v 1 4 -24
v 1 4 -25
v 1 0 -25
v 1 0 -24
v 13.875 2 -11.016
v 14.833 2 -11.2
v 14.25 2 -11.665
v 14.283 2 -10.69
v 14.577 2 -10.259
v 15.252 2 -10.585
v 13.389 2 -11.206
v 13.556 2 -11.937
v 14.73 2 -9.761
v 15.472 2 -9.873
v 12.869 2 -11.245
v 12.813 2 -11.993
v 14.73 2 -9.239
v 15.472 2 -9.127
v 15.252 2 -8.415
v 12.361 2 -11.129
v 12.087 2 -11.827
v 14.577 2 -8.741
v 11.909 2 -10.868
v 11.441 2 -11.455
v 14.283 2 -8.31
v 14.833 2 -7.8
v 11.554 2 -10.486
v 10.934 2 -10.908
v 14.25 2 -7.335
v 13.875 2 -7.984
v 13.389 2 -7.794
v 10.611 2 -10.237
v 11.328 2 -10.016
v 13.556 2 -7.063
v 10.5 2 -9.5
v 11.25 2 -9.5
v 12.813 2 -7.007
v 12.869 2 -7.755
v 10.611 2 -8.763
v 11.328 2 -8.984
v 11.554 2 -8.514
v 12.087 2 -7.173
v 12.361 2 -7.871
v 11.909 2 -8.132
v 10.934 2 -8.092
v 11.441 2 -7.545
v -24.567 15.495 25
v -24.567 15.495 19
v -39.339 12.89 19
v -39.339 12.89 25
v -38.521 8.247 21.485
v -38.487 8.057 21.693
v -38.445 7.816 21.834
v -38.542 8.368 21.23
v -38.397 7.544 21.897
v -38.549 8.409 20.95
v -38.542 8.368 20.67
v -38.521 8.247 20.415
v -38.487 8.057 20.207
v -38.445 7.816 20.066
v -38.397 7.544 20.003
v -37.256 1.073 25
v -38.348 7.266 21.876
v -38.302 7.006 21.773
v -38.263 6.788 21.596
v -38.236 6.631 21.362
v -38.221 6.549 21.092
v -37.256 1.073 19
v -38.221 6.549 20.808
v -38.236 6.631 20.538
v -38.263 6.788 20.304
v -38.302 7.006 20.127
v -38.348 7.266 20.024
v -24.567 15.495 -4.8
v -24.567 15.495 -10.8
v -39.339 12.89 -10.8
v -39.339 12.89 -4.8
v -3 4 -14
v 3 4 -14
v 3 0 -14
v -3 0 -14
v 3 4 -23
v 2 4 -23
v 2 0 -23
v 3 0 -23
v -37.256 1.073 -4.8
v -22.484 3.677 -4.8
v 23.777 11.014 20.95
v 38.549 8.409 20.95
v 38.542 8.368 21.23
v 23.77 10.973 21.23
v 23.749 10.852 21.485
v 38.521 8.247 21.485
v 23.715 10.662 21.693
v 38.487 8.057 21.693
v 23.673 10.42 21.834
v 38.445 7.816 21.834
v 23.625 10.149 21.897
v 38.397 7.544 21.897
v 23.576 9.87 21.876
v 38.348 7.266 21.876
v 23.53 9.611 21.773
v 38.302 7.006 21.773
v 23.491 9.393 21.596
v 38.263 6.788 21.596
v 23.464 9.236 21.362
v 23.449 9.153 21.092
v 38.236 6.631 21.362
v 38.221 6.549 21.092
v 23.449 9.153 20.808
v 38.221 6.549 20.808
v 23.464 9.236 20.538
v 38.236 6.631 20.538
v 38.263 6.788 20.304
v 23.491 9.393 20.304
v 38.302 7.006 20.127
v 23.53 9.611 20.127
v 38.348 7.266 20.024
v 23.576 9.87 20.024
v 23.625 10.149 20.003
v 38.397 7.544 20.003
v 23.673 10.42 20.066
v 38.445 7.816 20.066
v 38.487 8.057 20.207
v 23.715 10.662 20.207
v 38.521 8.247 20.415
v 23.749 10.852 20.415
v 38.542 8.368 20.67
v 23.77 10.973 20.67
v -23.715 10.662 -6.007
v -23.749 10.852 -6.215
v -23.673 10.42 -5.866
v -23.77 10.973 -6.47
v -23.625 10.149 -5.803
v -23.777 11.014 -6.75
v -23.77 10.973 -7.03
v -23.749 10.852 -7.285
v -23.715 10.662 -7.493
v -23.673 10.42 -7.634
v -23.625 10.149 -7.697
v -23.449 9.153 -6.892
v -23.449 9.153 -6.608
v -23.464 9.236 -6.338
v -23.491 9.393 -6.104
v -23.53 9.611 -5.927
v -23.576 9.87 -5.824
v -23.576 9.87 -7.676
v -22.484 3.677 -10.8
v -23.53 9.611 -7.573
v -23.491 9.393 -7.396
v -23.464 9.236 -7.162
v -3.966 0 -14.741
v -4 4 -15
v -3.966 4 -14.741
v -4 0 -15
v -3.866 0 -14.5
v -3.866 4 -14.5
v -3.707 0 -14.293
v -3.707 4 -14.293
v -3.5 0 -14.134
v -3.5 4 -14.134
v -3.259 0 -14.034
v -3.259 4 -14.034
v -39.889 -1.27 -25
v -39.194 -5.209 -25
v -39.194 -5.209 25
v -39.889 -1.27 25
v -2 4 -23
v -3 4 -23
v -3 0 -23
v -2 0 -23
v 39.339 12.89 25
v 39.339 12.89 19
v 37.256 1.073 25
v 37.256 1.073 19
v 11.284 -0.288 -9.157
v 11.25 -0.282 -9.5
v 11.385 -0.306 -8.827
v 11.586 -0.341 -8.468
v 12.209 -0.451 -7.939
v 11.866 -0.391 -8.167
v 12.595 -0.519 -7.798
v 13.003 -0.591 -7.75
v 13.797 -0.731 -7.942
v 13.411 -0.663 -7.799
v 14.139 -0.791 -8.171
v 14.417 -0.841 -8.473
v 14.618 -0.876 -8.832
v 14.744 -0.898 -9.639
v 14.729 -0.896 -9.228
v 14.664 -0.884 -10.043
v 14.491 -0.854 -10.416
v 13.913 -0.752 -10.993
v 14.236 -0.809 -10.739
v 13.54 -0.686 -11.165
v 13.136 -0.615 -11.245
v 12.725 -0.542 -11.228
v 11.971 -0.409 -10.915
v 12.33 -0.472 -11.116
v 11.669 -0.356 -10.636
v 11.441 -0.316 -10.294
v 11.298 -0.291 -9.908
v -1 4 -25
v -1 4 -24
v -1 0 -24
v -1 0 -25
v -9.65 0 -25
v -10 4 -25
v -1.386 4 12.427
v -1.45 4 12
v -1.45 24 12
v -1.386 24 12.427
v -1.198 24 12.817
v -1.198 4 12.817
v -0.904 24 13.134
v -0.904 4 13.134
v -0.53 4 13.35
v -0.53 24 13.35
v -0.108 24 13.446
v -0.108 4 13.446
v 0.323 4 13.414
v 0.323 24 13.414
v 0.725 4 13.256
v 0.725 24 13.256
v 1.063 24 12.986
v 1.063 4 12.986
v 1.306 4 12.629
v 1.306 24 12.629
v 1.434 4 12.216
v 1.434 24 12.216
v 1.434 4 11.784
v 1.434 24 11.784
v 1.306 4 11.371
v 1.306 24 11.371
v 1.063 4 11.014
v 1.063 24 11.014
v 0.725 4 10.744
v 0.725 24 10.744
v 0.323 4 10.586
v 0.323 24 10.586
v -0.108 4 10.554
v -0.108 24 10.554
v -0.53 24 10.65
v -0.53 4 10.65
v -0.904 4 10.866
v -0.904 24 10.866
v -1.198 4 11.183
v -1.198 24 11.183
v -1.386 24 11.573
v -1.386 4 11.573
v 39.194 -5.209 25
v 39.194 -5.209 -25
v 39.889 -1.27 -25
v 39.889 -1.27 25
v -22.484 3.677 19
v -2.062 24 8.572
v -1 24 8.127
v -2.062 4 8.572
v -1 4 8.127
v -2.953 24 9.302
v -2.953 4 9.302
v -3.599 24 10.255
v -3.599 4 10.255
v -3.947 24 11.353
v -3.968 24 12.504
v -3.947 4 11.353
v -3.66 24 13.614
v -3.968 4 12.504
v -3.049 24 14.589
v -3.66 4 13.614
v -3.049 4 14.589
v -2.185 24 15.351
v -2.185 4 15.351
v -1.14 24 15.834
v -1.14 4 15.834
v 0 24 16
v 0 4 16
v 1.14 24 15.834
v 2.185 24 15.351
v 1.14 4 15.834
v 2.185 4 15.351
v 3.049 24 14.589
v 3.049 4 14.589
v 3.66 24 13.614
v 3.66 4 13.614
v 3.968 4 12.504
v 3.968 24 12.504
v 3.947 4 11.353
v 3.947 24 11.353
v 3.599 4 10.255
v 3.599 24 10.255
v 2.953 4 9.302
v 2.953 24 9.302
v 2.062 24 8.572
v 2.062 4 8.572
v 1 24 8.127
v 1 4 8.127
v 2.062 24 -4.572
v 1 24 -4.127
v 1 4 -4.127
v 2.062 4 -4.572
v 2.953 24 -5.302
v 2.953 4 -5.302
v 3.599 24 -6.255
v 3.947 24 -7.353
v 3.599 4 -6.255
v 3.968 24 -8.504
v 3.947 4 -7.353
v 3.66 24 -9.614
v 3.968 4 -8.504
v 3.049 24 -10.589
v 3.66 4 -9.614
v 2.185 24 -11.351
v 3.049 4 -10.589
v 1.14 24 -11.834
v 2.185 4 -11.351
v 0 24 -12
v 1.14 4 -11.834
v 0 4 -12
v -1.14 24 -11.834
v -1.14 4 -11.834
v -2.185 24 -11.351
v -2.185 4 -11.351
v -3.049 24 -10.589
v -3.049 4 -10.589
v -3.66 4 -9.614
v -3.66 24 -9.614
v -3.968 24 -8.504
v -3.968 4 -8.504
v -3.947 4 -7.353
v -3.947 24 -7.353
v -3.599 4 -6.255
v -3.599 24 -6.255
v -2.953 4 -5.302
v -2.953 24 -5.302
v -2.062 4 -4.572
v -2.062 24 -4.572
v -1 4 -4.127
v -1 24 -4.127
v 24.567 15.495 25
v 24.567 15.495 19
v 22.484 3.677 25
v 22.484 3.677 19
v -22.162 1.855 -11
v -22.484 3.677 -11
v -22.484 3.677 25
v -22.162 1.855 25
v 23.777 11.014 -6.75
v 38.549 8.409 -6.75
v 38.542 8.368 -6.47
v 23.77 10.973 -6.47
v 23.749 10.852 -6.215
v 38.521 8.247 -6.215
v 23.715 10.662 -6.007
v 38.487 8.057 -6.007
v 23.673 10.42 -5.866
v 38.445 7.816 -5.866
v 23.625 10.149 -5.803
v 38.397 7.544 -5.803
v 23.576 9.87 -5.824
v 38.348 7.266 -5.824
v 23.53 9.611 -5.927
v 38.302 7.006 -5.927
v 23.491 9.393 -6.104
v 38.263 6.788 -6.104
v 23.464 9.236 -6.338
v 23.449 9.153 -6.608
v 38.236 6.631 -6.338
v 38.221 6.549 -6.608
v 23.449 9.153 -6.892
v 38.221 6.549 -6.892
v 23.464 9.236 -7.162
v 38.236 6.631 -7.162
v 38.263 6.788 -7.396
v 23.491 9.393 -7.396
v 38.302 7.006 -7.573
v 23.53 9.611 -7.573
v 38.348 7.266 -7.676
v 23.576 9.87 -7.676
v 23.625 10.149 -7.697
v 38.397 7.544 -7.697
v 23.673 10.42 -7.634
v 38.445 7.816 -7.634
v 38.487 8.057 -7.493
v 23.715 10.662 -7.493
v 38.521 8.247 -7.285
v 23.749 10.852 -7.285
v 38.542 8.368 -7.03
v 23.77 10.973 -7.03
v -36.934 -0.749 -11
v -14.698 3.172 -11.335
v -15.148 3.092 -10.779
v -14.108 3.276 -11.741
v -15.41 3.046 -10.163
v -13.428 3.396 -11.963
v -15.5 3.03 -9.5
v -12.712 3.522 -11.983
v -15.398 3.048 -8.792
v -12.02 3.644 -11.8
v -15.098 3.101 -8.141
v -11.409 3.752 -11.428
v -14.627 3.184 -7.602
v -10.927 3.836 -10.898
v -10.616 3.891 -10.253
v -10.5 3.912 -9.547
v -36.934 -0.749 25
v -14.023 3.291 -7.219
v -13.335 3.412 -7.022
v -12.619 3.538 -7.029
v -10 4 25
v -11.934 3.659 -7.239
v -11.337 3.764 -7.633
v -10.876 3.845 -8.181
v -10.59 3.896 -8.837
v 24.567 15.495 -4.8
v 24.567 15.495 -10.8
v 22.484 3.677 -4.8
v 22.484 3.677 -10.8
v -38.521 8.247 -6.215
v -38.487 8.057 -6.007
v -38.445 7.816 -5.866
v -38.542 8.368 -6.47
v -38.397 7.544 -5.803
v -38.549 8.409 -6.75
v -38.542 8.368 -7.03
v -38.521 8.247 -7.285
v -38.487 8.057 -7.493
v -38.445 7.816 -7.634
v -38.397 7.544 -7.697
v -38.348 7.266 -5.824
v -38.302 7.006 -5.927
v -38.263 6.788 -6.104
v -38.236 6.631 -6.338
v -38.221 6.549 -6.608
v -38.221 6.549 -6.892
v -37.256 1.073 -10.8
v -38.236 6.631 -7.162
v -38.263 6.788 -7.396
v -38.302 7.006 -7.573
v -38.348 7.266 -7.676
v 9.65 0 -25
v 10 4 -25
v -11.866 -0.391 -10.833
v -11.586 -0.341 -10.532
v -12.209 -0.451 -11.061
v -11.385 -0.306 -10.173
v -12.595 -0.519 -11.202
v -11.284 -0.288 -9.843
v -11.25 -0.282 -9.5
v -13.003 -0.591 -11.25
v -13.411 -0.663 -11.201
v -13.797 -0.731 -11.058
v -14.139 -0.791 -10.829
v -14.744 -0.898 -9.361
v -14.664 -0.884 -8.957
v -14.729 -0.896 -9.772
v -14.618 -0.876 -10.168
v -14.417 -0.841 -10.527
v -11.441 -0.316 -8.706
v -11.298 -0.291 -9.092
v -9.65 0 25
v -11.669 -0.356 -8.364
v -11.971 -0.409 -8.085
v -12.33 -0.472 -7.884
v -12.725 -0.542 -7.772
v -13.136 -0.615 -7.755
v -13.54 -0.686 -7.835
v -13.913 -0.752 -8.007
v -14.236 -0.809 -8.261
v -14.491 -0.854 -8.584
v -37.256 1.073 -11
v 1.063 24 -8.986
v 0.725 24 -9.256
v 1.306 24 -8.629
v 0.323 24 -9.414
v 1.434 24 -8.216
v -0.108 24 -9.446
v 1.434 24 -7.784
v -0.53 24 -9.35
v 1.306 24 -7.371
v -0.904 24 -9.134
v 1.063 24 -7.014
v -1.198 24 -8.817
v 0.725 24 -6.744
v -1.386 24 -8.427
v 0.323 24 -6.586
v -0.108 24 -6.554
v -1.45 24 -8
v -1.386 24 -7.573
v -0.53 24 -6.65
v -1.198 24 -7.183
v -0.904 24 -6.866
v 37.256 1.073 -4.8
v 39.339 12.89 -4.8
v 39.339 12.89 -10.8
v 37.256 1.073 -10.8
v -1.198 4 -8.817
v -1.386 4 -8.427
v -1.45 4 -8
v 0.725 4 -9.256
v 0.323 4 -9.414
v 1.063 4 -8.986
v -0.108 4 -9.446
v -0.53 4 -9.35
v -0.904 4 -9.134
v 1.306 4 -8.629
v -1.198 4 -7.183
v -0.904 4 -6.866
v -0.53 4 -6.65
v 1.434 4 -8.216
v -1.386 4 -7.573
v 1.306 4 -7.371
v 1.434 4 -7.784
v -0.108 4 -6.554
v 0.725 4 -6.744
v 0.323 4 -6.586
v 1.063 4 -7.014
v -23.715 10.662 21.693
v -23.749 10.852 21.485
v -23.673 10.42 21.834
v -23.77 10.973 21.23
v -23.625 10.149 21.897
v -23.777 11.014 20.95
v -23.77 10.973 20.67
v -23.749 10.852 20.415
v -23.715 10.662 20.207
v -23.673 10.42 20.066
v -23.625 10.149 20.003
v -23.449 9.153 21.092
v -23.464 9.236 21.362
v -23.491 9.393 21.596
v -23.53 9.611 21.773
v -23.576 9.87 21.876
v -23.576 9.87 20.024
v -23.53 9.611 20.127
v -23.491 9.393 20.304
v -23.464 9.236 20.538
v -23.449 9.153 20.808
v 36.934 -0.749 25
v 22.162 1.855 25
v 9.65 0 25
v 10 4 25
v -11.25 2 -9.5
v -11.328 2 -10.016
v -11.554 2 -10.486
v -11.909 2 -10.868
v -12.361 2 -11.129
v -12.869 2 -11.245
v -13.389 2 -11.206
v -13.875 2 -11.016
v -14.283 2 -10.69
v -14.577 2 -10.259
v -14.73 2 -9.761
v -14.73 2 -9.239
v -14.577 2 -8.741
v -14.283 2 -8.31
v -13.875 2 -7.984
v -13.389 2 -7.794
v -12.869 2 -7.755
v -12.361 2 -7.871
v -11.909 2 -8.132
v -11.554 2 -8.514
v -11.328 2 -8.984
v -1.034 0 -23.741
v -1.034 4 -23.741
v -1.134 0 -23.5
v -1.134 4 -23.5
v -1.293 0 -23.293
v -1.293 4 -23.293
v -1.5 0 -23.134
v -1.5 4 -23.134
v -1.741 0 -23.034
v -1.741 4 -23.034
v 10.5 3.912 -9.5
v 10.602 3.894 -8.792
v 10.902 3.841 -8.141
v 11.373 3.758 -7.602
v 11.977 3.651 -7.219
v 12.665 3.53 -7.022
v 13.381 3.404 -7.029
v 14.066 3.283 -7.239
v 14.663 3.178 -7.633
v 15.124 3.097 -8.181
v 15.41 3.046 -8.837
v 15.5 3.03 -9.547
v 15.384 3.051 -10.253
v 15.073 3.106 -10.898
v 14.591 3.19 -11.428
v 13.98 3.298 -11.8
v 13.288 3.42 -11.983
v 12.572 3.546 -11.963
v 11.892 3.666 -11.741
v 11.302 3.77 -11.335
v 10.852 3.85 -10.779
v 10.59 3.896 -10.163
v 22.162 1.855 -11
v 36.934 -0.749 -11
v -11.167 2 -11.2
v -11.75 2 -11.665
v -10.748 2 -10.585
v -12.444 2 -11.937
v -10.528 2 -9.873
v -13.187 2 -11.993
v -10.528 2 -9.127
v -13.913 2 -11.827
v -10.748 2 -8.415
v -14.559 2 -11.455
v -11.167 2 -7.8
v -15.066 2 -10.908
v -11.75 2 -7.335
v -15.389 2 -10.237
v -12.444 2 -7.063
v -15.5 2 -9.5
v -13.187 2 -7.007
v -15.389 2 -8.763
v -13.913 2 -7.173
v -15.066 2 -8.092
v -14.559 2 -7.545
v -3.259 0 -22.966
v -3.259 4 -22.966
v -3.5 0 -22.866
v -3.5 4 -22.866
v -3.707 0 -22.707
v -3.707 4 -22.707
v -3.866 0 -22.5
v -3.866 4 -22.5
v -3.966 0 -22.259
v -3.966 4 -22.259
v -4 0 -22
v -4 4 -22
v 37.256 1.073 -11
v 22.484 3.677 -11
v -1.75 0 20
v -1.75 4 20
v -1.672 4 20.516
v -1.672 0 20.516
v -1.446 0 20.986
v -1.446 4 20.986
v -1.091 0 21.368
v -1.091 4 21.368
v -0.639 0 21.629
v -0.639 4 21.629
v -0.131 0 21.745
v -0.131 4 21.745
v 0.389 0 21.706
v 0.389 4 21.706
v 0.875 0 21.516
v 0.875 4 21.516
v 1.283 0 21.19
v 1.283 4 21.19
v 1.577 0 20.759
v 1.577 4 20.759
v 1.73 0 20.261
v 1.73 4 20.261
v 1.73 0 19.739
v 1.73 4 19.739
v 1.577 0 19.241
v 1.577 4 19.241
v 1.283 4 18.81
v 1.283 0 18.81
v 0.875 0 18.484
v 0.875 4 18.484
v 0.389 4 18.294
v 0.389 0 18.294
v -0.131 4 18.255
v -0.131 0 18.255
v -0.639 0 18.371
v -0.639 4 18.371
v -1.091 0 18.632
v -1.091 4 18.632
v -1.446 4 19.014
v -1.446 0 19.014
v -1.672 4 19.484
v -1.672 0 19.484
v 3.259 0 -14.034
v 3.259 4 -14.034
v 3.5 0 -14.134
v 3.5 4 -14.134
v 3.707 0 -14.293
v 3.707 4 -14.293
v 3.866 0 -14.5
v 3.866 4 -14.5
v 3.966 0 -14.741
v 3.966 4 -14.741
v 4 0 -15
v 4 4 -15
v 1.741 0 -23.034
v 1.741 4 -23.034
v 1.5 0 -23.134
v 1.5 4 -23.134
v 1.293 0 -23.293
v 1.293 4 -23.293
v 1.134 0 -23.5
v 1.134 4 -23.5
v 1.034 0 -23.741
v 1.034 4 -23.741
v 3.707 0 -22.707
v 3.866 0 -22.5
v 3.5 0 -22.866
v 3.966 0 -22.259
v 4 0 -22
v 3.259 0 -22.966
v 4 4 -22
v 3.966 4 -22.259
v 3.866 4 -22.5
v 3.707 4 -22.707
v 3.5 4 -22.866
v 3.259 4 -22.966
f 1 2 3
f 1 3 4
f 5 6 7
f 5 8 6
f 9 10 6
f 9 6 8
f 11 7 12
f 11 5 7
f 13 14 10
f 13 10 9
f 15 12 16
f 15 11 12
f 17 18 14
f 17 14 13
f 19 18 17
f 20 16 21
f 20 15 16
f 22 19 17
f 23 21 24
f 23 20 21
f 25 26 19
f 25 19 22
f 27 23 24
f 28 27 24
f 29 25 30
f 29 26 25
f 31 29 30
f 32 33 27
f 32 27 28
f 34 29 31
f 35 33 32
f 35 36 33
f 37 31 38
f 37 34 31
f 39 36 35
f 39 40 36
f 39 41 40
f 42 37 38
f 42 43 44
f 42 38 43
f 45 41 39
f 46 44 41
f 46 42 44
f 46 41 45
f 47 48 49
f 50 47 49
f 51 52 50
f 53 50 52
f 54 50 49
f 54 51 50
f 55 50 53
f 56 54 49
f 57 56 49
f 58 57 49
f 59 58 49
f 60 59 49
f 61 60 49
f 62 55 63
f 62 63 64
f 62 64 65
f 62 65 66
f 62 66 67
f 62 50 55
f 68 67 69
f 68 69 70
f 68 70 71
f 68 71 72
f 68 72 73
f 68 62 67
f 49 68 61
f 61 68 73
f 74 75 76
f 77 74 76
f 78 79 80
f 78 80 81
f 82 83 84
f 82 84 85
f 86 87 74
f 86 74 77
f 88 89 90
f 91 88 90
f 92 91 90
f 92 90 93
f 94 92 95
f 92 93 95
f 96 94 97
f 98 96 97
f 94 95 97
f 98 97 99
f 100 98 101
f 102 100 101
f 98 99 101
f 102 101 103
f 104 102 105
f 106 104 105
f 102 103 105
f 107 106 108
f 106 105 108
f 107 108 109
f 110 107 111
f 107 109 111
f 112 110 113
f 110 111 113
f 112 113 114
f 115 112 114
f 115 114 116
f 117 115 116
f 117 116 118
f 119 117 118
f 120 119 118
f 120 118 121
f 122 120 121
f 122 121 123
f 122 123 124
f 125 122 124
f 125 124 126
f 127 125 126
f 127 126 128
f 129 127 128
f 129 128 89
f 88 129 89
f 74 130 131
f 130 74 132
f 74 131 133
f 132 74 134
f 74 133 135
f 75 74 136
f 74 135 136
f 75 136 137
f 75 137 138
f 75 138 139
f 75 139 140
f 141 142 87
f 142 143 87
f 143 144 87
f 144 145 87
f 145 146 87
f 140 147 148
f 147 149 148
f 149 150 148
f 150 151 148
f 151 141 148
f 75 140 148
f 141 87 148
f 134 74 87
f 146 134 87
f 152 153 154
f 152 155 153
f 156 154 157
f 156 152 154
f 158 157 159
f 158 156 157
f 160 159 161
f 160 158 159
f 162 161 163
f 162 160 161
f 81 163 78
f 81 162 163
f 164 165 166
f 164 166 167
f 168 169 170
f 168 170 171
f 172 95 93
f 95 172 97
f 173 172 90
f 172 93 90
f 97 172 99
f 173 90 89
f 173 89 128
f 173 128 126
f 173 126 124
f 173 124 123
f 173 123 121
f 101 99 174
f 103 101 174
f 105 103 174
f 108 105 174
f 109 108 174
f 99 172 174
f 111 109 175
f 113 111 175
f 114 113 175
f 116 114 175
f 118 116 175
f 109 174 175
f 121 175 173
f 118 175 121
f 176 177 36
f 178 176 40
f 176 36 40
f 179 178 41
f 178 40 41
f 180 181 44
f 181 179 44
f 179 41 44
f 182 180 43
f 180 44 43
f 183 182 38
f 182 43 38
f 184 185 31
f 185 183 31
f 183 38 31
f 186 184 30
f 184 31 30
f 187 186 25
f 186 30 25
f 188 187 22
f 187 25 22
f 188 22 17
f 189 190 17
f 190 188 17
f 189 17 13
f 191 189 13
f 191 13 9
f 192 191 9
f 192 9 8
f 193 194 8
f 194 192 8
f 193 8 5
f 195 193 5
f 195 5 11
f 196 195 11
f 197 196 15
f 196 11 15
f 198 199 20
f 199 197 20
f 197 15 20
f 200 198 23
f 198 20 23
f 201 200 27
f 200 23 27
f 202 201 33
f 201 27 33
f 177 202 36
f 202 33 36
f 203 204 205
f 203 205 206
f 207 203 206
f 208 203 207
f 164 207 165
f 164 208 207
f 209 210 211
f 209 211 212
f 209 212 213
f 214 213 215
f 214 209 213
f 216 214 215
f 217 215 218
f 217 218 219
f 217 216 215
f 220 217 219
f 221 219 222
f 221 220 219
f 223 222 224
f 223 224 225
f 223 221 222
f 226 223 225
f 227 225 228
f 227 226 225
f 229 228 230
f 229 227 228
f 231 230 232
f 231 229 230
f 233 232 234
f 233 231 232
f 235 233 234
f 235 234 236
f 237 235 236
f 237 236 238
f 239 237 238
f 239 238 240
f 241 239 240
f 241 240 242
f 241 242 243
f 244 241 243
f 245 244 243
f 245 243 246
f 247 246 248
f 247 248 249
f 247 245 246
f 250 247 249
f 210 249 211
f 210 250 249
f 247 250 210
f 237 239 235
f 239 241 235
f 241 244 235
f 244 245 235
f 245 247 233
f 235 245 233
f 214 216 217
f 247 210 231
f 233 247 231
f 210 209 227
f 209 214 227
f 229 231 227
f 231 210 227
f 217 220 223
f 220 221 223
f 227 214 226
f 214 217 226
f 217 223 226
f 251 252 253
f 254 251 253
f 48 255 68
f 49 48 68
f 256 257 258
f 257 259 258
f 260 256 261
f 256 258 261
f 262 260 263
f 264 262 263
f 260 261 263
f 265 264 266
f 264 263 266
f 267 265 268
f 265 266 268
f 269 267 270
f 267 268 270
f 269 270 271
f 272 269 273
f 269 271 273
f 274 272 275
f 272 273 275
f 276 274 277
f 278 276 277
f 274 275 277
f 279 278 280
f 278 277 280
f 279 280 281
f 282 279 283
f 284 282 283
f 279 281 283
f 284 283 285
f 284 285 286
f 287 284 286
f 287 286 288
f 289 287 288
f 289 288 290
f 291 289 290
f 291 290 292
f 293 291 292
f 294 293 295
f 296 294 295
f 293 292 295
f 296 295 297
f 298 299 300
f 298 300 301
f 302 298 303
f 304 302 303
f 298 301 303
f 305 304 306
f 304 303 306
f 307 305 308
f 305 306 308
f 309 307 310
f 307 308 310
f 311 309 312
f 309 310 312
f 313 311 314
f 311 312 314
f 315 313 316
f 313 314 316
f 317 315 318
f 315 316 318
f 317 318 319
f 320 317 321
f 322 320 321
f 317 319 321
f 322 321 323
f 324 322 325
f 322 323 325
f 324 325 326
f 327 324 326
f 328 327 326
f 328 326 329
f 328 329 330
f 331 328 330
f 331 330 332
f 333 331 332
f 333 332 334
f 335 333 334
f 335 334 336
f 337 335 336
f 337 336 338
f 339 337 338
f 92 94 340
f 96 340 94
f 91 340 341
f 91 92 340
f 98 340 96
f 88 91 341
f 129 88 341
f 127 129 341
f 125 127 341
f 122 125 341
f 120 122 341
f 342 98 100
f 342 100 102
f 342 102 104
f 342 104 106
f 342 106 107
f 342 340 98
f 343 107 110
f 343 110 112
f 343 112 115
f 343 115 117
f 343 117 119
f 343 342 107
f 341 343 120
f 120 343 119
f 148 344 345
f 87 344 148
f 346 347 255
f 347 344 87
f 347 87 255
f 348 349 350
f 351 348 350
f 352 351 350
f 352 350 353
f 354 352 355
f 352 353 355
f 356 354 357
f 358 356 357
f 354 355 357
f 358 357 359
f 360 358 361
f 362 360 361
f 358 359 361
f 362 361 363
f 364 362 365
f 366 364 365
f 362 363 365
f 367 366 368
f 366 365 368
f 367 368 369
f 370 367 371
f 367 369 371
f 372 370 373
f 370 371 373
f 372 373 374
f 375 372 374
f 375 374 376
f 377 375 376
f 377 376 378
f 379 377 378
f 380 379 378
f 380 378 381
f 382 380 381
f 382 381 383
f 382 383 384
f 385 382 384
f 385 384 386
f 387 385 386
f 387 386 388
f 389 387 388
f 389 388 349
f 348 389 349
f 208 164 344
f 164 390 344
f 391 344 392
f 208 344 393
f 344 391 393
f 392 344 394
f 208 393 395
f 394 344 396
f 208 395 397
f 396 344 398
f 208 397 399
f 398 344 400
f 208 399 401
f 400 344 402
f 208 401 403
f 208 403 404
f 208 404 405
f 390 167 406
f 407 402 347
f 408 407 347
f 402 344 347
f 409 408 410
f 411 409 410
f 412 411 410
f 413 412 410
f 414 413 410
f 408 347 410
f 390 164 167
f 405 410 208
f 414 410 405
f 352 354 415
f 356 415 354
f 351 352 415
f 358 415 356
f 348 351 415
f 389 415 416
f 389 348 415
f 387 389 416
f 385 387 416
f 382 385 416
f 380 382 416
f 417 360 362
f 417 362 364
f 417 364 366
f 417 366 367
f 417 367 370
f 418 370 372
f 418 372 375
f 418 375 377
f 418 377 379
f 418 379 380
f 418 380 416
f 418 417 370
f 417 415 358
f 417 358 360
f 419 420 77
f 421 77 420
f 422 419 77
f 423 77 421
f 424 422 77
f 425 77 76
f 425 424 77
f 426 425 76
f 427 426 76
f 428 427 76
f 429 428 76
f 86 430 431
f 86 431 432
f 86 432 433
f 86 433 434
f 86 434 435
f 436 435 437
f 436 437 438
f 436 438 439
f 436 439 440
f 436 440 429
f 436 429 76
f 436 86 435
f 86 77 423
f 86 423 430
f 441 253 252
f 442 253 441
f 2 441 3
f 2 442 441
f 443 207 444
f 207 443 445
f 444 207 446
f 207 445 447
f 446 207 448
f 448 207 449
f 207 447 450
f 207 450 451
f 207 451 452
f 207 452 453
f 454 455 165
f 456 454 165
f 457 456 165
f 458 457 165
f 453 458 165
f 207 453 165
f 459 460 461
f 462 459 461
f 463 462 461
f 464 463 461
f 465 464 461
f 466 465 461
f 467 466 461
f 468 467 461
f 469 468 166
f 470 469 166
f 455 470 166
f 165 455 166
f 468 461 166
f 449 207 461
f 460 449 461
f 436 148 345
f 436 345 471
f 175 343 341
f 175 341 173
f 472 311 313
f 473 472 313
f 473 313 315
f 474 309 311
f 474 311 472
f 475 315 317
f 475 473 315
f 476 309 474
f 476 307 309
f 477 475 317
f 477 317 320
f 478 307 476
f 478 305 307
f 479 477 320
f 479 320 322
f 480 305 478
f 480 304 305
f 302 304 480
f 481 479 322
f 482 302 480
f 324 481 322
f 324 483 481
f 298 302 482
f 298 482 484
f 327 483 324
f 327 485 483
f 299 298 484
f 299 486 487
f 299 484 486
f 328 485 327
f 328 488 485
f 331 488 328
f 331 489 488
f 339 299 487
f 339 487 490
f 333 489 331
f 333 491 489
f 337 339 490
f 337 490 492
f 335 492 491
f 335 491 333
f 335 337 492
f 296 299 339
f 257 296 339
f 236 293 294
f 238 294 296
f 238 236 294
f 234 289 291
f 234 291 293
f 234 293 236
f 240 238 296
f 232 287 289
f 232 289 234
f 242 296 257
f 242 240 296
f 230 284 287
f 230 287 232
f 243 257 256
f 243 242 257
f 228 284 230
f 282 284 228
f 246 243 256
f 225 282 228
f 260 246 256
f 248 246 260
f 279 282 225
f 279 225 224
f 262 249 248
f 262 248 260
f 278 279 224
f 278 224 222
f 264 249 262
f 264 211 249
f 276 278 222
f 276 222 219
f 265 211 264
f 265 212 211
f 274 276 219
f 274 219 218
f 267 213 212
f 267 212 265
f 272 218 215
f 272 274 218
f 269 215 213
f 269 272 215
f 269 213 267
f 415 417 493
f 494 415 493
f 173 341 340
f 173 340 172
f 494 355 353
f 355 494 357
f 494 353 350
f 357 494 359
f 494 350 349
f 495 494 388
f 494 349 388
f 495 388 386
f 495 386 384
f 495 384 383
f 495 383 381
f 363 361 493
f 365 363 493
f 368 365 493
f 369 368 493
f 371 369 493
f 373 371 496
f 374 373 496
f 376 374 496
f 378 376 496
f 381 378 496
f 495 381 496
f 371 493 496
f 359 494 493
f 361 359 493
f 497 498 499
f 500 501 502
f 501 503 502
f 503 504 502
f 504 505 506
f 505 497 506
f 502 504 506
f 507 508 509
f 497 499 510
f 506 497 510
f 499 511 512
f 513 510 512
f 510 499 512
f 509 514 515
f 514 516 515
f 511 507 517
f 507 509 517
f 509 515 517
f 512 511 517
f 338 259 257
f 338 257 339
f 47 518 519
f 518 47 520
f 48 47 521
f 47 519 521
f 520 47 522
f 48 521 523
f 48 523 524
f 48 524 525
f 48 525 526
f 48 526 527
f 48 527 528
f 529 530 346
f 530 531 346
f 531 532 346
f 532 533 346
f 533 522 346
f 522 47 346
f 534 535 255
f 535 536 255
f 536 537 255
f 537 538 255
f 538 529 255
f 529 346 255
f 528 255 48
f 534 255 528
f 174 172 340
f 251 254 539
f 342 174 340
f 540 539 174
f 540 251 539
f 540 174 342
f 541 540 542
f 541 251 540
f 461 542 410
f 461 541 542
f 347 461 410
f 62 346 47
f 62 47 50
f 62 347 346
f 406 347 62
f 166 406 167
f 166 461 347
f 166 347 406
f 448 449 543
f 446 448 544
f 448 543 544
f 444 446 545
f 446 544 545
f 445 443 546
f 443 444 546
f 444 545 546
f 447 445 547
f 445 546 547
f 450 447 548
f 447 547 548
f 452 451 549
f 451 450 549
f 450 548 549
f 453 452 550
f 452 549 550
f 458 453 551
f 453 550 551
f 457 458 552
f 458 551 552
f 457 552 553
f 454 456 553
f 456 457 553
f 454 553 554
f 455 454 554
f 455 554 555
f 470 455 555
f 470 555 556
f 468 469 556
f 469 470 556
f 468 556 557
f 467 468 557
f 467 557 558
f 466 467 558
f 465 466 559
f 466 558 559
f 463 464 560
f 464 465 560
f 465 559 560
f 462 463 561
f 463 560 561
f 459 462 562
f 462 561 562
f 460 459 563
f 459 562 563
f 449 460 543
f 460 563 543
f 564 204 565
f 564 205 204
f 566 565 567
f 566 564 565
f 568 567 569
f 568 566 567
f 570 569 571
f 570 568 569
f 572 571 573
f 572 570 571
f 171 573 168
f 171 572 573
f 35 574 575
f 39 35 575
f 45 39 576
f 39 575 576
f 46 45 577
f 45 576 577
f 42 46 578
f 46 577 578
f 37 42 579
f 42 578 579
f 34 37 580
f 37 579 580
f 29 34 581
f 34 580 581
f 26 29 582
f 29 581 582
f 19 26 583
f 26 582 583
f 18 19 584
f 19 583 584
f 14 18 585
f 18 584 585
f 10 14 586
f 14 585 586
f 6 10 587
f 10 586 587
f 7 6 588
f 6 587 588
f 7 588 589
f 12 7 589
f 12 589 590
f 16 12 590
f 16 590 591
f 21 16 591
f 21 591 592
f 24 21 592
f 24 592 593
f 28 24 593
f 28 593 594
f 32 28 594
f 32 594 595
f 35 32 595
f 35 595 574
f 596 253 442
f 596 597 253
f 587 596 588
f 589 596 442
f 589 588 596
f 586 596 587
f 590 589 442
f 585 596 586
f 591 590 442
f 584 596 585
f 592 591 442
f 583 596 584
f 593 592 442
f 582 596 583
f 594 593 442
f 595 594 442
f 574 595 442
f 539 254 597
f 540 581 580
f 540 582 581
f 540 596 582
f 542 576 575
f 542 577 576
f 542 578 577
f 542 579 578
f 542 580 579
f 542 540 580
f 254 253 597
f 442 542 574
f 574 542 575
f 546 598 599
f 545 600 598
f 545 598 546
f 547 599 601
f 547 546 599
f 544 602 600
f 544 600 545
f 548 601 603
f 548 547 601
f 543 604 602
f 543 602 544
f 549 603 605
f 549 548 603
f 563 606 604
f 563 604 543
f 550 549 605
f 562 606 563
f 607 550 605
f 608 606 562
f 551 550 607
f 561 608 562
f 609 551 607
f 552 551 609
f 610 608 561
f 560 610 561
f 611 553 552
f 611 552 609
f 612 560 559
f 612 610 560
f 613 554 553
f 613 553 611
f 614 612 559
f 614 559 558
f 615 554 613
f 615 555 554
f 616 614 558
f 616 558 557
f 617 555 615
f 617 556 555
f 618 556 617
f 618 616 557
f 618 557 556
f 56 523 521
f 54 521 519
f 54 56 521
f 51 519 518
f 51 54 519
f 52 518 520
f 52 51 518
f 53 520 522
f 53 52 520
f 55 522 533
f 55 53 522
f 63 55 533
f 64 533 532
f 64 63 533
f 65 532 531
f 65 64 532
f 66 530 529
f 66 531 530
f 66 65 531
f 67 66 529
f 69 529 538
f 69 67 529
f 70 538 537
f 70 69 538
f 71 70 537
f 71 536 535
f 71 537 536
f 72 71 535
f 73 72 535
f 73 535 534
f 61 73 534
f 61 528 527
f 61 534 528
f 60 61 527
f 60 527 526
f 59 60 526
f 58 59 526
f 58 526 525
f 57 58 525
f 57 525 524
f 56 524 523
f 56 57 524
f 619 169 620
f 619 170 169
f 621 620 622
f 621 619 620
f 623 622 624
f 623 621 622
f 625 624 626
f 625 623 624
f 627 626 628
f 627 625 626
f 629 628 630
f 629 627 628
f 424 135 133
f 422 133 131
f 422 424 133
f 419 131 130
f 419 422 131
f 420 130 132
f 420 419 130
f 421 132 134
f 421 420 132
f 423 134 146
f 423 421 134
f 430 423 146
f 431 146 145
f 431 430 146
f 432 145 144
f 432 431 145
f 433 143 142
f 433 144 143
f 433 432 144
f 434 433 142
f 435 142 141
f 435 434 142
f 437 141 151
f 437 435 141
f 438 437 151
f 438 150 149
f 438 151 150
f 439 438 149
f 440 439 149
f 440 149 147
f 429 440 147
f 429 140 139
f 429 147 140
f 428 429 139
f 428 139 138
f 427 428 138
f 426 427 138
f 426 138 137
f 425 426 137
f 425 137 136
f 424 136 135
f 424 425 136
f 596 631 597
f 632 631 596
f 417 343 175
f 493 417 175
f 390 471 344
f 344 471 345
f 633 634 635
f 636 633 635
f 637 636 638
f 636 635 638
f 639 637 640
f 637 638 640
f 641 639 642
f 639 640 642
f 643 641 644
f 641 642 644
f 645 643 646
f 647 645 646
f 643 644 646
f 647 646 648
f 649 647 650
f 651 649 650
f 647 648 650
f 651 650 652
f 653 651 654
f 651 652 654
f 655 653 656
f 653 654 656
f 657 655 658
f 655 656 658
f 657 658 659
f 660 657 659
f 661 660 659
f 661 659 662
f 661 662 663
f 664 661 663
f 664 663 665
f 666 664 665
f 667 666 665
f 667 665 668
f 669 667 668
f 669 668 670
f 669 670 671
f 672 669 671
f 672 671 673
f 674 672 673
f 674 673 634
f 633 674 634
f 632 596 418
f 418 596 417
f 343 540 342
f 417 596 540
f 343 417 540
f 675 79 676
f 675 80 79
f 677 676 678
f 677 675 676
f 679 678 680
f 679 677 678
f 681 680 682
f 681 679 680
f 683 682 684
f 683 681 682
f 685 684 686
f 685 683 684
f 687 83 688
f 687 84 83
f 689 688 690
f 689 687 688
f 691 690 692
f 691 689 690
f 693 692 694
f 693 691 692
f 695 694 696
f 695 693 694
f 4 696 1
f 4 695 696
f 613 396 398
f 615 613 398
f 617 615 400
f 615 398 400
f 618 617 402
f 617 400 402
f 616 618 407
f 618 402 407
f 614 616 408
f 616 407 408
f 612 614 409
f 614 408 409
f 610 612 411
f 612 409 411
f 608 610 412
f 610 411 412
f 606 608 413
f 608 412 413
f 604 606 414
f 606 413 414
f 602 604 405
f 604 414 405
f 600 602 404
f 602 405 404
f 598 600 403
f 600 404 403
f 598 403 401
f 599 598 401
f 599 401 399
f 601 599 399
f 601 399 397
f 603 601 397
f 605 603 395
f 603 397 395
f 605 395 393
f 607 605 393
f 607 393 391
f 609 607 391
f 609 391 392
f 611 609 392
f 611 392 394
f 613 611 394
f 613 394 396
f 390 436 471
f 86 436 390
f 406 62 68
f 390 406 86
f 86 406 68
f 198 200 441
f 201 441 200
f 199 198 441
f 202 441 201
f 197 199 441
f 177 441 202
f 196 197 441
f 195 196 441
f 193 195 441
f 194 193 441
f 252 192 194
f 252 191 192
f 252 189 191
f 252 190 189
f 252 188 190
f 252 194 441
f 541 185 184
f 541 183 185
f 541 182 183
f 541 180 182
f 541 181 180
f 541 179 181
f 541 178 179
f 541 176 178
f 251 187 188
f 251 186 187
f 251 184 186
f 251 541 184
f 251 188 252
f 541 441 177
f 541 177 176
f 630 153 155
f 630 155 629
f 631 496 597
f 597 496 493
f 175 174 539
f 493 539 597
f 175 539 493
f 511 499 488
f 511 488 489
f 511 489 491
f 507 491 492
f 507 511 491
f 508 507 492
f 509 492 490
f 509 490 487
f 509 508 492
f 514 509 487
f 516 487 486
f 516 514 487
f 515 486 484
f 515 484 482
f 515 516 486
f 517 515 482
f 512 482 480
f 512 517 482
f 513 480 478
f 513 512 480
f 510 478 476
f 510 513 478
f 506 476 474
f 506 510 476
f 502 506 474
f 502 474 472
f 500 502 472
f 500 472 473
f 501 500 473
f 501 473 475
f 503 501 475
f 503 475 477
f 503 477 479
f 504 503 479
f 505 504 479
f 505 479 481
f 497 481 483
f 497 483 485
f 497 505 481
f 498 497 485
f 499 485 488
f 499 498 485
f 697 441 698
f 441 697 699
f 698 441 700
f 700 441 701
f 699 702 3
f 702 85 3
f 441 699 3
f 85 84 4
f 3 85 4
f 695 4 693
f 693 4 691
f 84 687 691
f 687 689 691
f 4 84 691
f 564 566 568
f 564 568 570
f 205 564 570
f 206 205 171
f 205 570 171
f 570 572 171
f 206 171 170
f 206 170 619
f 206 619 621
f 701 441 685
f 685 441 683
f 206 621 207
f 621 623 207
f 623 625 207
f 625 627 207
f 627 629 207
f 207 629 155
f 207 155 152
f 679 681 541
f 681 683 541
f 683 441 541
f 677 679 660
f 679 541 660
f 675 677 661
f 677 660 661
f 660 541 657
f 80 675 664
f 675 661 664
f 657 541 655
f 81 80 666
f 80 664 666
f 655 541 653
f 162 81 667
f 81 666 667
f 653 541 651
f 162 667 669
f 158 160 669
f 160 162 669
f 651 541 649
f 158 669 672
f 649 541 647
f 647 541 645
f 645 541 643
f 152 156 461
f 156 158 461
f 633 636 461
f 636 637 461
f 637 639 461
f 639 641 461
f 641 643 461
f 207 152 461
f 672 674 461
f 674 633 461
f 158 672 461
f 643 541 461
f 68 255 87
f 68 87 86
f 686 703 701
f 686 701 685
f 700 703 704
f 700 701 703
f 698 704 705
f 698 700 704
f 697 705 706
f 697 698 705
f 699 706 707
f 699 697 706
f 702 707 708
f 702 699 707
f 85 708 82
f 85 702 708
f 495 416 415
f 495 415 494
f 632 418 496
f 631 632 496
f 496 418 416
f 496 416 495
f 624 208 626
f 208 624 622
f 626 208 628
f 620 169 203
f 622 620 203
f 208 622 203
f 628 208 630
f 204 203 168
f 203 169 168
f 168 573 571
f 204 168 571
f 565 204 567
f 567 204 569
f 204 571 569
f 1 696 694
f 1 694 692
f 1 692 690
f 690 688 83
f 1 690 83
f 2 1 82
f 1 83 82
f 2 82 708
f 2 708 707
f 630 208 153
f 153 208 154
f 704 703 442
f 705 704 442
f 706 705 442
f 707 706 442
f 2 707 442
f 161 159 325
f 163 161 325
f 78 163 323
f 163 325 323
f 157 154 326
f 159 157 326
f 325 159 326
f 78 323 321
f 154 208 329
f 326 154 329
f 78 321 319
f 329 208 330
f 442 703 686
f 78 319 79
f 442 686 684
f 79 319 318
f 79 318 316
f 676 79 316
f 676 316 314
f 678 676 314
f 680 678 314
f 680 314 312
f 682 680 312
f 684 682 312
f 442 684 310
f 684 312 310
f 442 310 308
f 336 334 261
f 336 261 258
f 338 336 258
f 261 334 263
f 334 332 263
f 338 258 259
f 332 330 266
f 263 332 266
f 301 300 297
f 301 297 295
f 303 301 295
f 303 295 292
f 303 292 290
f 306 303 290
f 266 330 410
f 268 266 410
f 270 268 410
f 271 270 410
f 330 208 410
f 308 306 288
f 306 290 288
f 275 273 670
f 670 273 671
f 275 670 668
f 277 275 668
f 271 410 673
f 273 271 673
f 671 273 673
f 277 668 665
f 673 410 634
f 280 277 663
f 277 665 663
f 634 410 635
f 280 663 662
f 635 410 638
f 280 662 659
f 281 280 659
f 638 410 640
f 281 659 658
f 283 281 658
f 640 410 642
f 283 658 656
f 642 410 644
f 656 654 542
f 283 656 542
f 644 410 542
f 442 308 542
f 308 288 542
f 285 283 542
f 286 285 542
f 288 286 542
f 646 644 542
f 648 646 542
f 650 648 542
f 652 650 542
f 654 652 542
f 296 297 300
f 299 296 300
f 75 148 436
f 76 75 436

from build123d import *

# Parameters (mm, degrees)
EXTRUDE_1_DEPTH     = 25
EXTRUDE_2_DEPTH     = 36
SKETCH_3_W          = 15
SKETCH_3_H          = 6
EXTRUDE_3_DEPTH     = 12
SKETCH_4_R          = 0.95
CUT_EXTRUDE_1_DEPTH = 21
SKETCH_5_R          = 4
SKETCH_5_R_2        = 1.45
EXTRUDE_4_DEPTH     = 20
EXTRUDE_4_2_DEPTH   = 20
SKETCH_6_R          = 1.75
CUT_EXTRUDE_2_DEPTH = 20
SKETCH_7_R          = 2.5
CUT_EXTRUDE_3_DEPTH = 2
CUT_EXTRUDE_4_DEPTH = 52.148040055
FILLET_4_R          = 1
SKETCH_9_W          = 2
SKETCH_9_H          = 14
EXTRUDE_5_DEPTH     = 20


with BuildPart() as part:
    # 草图1 → 凸台-拉伸1 (new, symmetric)
    with BuildSketch(Plane.XY):
        Polygon((0, 0), (9.650045346, 0), (39.194277936, -5.20944533), (39.888870647, -1.270214318), (10, 4), (0, 4), align=None)
    extrude_1 = extrude(amount=EXTRUDE_1_DEPTH, both=True)

    # 草图2 → 凸台-拉伸2 (add)
    with BuildSketch(Plane.XY.offset(25)):
        Polygon((22.162331093, 1.85545288), (22.483580221, 3.677347223), (37.255696517, 1.072624558), (36.934447388, -0.749269785), align=None)
    extrude_2 = extrude(amount=-EXTRUDE_2_DEPTH)

    # 草图3 → 凸台-拉伸3 (add)
    with BuildSketch(Plane(origin=(1.306826311, 7.411380301, 0), x_dir=(0.9848077530122079, -0.1736481776669312, 0), z_dir=(0.1736481776669312, 0.9848077530122079, 0))):
        with Locations((29.003439474, -22)):
            Rectangle(SKETCH_3_W, SKETCH_3_H)
        with Locations((29.003439474, 7.8)):
            Rectangle(SKETCH_3_W, SKETCH_3_H)
    extrude_3 = extrude(amount=EXTRUDE_3_DEPTH)

    # 草图4 → 切除-拉伸1 (cut)
    with BuildSketch(Plane(origin=(35.948870205, -6.338755743, 0), x_dir=(0, 0, -1), z_dir=(0.9848077530122081, -0.17364817766693072, 0))):
        with Locations(Location((-20.95, 14.025712789, 0), (0, 0, 90))):
            Circle(SKETCH_4_R)
        with Locations(Location((6.75, 14.025712789, 0), (0, 0, 90))):
            Circle(SKETCH_4_R)
    cut_extrude_1 = extrude(amount=-CUT_EXTRUDE_1_DEPTH, mode=Mode.SUBTRACT)

    # 镜向1: 凸台-拉伸1, 凸台-拉伸2, 凸台-拉伸3, 切除-拉伸1 across plane
    add(extrude_1.mirror(Plane(origin=(0, 0, 0), x_dir=(0, 0, 1), z_dir=(1, 0, 0))))
    add(extrude_2.mirror(Plane(origin=(0, 0, 0), x_dir=(0, 0, 1), z_dir=(1, 0, 0))))
    add(extrude_3.mirror(Plane(origin=(0, 0, 0), x_dir=(0, 0, 1), z_dir=(1, 0, 0))))
    add(cut_extrude_1.mirror(Plane(origin=(0, 0, 0), x_dir=(0, 0, 1), z_dir=(1, 0, 0))), mode=Mode.SUBTRACT)

    # 草图6 → 切除-拉伸2 (cut)
    with BuildSketch(Plane(origin=(0, 4, 0), x_dir=(1, 0, 0), z_dir=(0, 1, 0))):
        with Locations(Location((0, -20, 0), (0, 0, 180))):
            Circle(SKETCH_6_R)
        with Locations((-13, 9.5)):
            Circle(SKETCH_6_R)
        with Locations(Location((13, 9.5, 0), (0, 0, 180))):
            Circle(SKETCH_6_R)
    extrude(amount=-CUT_EXTRUDE_2_DEPTH, mode=Mode.SUBTRACT)

    # 草图7 → 切除-拉伸3 (cut)
    with BuildSketch(Plane(origin=(0, 4, 0), x_dir=(1, 0, 0), z_dir=(0, 1, 0))):
        with Locations(Location((-13, 9.5, 0), (0, 0, 180))):
            Circle(SKETCH_7_R)
        with Locations(Location((13, 9.5, 0), (0, 0, 180))):
            Circle(SKETCH_7_R)
    extrude(amount=-CUT_EXTRUDE_3_DEPTH, mode=Mode.SUBTRACT)

    # 草图8 → 切除-拉伸4 (cut, through all)
    with BuildSketch(Plane(origin=(0, 4, 0), x_dir=(1, 0, 0), z_dir=(0, 1, 0))):
        Polygon((-4, 23), (-1, 23), (-1, 25), (1, 25), (1, 23), (4, 23), (4, 14), (-4, 14), align=None)
    extrude(amount=-CUT_EXTRUDE_4_DEPTH, mode=Mode.SUBTRACT)

    # 圆角4
    fillet_4_edges = [part.edges().sort_by_distance(p)[0] for p in [
        (4, 2, -23),
        (4, 2, -14),
        (-4, 2, -14),
        (-4, 2, -23),
        (1, 2, -23),
        (-1, 2, -23),
    ]]
    fillet(fillet_4_edges, radius=FILLET_4_R)



with BuildPart() as body_2:
    # 草图5 → 凸台-拉伸4 (new body)
    with BuildSketch(Plane(origin=(0, 4, 0), x_dir=(1, 0, 0), z_dir=(0, 1, 0))):
        with Locations(Location((0, -12, 0), (0, 0, 180))):
            Circle(SKETCH_5_R)
        with Locations(Location((0, -12, 0), (0, 0, 180))):
            Circle(SKETCH_5_R_2, mode=Mode.SUBTRACT)
    extrude(amount=EXTRUDE_4_DEPTH)


with BuildPart() as body_3:
    # 草图5 → Extrude 4 2 (new body)
    with BuildSketch(Plane(origin=(0, 4, 0), x_dir=(1, 0, 0), z_dir=(0, 1, 0))):
        with Locations(Location((0, 8, 0), (0, 0, 180))):
            Circle(SKETCH_5_R)
        with Locations(Location((0, 8, 0), (0, 0, 180))):
            Circle(SKETCH_5_R_2, mode=Mode.SUBTRACT)
    extrude(amount=EXTRUDE_4_2_DEPTH)


with BuildPart() as part_1:
    add(part.part)

    add(body_2.part)  # 凸台-拉伸5 merges body 2

    add(body_3.part)  # 凸台-拉伸5 merges body 3
    # 草图9 → 凸台-拉伸5 (add)
    with BuildSketch(Plane(origin=(0, 4, 0), x_dir=(1, 0, 0), z_dir=(0, 1, 0))):
        with Locations((0, -2)):
            Rectangle(SKETCH_9_W, SKETCH_9_H)
    extrude(amount=EXTRUDE_5_DEPTH)


solid = part_1.part
